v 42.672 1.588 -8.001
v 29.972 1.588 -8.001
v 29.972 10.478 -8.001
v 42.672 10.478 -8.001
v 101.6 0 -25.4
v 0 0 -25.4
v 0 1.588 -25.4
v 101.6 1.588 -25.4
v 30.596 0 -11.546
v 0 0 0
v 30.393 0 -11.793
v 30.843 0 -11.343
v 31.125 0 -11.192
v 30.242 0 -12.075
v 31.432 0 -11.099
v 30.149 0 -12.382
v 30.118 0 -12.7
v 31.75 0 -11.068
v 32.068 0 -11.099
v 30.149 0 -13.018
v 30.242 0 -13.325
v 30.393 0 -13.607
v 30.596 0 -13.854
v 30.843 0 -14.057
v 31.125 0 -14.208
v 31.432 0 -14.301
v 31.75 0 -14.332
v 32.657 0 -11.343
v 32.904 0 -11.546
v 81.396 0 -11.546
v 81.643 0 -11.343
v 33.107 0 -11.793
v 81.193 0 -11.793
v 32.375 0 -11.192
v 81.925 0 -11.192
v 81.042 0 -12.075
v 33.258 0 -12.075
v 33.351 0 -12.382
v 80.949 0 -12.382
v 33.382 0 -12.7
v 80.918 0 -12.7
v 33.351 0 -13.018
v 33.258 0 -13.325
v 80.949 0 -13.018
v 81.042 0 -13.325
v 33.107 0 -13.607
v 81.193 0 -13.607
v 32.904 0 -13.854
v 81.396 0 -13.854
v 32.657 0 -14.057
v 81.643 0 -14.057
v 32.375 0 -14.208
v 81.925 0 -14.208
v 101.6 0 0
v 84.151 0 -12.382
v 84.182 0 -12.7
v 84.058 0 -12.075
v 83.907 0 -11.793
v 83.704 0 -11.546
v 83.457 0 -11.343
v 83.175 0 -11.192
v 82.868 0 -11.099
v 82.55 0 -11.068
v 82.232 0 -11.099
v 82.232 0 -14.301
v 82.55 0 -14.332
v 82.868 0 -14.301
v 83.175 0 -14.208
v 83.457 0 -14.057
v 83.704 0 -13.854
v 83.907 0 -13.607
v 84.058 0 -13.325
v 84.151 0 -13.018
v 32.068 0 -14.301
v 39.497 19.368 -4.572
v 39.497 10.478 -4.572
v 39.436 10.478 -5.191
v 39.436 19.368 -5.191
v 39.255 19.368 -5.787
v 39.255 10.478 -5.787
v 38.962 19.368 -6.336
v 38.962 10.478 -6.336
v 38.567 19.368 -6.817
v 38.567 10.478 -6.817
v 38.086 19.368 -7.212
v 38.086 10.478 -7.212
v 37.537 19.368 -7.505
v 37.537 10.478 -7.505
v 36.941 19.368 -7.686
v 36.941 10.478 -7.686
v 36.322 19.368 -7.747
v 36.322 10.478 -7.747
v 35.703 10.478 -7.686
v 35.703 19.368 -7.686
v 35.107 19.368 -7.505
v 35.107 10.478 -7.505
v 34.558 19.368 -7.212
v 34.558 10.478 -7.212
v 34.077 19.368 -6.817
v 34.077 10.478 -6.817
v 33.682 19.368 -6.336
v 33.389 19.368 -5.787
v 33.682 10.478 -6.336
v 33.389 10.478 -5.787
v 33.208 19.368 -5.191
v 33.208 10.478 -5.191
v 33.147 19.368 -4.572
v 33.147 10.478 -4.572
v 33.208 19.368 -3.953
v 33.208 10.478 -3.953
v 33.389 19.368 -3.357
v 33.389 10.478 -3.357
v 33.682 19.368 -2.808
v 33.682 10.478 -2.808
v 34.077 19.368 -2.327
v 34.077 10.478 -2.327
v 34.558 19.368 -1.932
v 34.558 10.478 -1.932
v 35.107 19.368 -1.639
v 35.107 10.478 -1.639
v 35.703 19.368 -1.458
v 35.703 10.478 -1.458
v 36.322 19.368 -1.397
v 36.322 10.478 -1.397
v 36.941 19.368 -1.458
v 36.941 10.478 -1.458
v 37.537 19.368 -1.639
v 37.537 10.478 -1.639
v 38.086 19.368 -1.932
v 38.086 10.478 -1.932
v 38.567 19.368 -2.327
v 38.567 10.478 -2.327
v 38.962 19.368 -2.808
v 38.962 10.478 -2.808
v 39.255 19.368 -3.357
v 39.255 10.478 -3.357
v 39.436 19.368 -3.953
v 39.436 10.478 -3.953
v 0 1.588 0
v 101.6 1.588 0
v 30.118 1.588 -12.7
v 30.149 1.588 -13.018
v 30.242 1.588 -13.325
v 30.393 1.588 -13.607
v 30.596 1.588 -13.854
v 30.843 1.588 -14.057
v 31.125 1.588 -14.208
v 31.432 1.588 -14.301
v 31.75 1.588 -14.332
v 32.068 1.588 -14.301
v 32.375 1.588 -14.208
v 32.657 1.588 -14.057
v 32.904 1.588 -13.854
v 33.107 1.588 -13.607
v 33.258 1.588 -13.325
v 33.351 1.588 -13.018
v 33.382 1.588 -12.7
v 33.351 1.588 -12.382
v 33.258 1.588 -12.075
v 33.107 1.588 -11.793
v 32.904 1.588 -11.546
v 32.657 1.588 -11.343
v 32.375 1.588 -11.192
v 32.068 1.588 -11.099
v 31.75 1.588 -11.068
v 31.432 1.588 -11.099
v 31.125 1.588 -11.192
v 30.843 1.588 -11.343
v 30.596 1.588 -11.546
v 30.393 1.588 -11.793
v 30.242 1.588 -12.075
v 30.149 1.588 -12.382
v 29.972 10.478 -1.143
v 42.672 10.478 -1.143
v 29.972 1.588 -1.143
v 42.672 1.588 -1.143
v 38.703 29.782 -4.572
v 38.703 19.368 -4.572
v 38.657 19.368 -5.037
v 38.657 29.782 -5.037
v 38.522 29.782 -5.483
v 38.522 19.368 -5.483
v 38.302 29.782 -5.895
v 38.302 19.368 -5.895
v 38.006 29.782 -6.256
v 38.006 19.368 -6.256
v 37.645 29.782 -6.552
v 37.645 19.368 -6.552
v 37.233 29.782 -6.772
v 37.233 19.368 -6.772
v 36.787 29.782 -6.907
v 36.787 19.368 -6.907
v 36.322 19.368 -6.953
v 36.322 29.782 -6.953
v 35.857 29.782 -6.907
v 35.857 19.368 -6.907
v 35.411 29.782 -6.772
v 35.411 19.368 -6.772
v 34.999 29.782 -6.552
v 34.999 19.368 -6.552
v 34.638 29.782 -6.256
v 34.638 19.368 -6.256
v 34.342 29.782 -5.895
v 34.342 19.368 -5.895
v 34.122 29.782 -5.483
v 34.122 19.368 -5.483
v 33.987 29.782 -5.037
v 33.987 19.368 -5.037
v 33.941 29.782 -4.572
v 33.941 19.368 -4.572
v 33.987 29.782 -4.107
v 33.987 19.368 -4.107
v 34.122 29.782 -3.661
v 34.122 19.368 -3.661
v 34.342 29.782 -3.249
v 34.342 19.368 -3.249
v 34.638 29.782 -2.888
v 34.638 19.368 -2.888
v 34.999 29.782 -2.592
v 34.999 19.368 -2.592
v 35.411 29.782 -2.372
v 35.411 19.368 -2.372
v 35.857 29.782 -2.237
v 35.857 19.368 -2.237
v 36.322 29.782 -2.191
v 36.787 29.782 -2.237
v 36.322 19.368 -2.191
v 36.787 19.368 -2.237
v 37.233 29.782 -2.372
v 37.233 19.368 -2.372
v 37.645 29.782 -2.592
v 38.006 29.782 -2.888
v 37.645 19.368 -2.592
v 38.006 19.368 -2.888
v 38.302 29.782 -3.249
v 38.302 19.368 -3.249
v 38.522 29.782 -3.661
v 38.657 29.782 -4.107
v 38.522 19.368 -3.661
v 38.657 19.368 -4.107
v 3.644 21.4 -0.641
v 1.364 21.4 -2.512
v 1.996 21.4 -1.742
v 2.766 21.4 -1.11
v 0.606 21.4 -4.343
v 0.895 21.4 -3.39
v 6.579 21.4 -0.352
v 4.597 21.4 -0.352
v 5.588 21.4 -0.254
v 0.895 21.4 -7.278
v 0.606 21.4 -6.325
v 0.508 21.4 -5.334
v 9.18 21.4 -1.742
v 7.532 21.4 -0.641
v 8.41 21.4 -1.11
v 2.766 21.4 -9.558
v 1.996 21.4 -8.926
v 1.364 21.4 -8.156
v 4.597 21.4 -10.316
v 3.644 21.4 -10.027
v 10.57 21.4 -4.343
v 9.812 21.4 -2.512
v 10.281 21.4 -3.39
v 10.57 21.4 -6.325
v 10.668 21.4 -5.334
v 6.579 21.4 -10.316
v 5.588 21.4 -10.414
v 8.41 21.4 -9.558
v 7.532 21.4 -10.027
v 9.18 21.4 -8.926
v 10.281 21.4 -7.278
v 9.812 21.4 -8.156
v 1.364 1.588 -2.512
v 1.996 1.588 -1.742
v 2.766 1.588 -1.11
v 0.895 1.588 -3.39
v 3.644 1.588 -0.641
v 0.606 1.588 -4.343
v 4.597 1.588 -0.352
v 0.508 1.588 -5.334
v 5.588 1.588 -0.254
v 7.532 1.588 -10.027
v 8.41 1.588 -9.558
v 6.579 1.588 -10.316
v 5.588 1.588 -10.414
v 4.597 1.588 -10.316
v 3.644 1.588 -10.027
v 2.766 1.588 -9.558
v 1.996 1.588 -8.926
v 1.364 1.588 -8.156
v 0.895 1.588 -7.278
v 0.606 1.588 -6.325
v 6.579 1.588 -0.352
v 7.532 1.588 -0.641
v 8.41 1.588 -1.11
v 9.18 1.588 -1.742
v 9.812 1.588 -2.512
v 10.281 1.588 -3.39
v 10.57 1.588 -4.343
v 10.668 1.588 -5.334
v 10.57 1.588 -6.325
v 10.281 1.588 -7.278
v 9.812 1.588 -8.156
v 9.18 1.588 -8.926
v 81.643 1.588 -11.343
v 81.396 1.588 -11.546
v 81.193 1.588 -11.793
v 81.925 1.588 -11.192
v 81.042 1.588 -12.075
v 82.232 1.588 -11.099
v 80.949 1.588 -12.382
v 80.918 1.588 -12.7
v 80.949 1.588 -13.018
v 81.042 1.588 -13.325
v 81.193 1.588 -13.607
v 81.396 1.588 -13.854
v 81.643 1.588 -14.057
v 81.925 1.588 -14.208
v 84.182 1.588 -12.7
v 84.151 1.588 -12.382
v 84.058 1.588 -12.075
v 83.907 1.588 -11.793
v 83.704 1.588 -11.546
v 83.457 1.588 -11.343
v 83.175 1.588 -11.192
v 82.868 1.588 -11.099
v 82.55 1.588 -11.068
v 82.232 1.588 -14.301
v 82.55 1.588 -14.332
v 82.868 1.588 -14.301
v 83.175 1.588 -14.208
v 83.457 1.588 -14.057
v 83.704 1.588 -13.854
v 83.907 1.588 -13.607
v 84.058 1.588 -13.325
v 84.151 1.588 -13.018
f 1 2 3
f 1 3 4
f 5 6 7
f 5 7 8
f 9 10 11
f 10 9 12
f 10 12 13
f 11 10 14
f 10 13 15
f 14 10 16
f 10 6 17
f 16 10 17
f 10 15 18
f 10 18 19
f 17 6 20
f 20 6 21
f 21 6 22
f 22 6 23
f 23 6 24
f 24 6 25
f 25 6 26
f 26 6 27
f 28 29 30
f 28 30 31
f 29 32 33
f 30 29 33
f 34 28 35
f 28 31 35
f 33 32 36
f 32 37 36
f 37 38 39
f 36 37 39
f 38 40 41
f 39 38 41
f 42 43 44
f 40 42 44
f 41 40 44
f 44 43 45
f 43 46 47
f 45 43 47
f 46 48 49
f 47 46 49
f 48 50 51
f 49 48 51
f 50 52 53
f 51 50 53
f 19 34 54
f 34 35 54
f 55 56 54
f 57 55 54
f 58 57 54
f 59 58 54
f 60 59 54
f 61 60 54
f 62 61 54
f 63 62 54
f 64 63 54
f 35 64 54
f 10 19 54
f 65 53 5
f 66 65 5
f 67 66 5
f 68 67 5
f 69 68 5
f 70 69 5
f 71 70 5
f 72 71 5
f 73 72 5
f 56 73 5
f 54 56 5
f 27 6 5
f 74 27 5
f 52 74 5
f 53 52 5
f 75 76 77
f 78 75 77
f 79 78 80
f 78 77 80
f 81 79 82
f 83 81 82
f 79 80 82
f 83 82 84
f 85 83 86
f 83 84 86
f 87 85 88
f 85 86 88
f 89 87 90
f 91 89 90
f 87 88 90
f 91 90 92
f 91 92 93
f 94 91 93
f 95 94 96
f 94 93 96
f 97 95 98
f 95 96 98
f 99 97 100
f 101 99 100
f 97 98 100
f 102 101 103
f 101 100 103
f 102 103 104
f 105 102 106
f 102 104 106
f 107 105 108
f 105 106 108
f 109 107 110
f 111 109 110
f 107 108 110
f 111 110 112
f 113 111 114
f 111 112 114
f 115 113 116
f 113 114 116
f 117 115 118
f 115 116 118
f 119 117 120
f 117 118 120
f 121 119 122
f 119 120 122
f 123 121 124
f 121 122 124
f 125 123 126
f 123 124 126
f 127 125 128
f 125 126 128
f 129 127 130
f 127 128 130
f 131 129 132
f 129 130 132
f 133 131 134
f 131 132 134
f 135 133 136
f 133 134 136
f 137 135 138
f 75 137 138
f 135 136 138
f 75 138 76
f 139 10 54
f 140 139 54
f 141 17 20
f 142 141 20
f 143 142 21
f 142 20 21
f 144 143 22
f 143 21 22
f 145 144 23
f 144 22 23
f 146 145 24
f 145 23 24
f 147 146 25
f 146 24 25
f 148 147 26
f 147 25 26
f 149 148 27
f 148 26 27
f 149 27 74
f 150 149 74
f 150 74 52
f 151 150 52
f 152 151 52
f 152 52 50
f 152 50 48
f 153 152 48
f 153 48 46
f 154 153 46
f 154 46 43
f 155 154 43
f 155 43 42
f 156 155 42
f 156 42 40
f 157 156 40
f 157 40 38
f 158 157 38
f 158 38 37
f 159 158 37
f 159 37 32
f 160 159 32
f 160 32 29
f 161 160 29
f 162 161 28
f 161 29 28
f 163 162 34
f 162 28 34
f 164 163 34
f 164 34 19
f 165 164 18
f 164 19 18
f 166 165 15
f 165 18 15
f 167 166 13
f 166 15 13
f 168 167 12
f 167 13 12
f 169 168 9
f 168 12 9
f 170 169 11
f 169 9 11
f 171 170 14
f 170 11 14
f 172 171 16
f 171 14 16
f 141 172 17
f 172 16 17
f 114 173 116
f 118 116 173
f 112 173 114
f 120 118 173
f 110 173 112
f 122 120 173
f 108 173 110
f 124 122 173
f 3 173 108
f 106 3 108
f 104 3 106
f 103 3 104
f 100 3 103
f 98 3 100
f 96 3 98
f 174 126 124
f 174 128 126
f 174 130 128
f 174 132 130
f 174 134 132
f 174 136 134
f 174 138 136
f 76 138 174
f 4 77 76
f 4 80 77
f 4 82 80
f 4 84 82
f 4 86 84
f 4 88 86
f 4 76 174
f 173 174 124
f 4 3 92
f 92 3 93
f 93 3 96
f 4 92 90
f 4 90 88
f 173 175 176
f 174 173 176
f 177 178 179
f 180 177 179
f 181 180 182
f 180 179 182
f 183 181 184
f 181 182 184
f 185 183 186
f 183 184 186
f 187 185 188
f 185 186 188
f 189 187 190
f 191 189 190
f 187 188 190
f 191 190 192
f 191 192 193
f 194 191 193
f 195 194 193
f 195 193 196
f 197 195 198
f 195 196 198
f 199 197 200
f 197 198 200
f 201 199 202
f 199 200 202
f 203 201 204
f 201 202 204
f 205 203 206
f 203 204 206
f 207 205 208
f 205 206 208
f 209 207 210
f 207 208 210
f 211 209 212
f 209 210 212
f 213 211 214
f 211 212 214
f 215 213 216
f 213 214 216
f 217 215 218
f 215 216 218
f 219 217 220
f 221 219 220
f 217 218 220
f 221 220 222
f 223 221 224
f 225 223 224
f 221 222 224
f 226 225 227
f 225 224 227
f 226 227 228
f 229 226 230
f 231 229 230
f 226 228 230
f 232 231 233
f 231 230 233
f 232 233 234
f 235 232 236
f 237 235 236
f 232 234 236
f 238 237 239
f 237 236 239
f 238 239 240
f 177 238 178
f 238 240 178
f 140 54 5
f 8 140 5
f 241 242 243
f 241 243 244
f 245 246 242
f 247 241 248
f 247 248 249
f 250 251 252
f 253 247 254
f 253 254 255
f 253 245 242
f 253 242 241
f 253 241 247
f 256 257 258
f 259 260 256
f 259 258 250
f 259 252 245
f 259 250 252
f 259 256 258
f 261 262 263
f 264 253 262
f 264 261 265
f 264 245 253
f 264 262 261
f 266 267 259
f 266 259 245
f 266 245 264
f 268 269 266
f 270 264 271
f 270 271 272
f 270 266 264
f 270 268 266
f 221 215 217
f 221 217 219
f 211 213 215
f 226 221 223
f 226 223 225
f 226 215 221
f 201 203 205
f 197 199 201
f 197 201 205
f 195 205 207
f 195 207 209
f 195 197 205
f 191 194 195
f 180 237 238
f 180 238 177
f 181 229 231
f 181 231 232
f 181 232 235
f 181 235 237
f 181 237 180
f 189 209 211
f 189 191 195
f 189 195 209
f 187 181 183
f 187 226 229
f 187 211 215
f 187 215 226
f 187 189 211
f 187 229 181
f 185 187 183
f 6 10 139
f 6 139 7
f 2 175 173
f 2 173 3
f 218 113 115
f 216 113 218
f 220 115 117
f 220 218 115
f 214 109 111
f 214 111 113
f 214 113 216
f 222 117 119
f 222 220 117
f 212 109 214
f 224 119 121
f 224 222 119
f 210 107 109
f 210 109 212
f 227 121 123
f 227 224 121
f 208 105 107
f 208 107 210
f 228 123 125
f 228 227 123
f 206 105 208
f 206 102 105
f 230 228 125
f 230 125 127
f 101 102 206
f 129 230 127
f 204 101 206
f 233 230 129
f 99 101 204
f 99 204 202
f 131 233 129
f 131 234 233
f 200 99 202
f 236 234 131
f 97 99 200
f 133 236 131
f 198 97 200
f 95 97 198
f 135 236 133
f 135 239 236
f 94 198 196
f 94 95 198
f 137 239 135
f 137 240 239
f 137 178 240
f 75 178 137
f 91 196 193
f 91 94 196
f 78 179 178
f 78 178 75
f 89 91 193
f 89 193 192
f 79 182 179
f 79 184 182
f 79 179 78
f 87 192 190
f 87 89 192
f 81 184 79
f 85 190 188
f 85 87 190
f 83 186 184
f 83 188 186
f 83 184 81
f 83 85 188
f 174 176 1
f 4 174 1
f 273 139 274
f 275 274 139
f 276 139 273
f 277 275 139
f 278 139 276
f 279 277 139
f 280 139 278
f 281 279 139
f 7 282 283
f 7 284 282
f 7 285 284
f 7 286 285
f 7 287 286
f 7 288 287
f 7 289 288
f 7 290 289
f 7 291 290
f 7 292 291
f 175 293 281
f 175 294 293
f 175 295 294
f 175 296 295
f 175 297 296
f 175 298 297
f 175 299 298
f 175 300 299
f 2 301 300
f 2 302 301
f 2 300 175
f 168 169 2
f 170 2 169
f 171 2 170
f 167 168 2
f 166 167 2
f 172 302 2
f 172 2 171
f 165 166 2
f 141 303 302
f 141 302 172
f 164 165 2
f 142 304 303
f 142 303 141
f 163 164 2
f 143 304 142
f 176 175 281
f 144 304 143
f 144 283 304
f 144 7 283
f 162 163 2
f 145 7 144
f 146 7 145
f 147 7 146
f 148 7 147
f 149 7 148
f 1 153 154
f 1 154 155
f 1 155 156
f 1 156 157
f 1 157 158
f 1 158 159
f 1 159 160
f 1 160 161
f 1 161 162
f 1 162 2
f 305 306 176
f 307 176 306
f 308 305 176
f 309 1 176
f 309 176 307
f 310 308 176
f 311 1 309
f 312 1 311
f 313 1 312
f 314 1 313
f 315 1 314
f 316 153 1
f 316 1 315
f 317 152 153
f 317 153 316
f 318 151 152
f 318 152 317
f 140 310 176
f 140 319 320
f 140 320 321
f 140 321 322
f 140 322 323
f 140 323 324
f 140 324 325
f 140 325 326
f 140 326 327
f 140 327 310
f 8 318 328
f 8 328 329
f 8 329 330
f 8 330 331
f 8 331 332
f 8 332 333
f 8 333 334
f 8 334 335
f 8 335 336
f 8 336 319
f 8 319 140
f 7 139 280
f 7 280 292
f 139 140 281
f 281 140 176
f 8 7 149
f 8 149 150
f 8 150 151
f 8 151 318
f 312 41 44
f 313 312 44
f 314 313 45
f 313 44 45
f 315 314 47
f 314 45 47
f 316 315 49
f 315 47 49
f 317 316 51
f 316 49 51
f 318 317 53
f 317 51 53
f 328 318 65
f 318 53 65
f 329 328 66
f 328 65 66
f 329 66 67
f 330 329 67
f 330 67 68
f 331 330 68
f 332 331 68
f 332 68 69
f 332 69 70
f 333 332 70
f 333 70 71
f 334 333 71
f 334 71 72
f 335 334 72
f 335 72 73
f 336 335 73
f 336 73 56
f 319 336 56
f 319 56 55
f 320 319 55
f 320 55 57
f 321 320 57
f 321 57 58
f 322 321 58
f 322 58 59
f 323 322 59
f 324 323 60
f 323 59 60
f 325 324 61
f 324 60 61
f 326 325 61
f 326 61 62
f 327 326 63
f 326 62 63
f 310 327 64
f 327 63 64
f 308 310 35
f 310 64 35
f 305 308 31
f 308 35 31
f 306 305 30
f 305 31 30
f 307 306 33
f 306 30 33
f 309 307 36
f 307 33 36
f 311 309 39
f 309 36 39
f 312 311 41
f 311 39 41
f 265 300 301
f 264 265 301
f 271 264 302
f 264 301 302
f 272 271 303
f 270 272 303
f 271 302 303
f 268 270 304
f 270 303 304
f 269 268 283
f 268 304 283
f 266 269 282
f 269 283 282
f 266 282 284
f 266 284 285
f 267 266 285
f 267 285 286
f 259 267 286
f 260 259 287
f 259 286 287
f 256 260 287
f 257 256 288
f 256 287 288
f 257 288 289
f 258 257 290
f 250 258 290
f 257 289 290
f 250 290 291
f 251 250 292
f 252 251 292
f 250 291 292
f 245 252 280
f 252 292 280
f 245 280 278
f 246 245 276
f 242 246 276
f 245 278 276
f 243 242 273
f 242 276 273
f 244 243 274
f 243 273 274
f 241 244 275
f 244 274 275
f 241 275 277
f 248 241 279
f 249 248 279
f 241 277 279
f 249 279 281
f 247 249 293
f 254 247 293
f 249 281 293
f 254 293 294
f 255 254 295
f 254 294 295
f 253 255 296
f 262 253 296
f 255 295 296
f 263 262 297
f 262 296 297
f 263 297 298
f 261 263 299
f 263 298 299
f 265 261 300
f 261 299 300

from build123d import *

# Parameters (mm, degrees)
SKETCH1_W                 = 101.6
SKETCH1_H                 = 25.4
BOSS_EXTRUDE1_DEPTH       = 1.5875
F_4_CLEARANCE_HOLE2_D     = 3.2639
F_4_CLEARANCE_HOLE2_DEPTH = 1.5875
SKETCH5_R                 = 5.08
BOSS_EXTRUDE2_DEPTH       = 19.812
SKETCH6_W                 = 12.7
SKETCH6_H                 = 6.858
BOSS_EXTRUDE3_DEPTH       = 8.89
SKETCH7_R                 = 3.175
BOSS_EXTRUDE4_DEPTH       = 8.89
SKETCH8_R                 = 2.38125
BOSS_EXTRUDE5_DEPTH       = 10.414


with BuildPart() as part:
    # Sketch1 → Boss-Extrude1 (new body)
    with BuildSketch(Plane(origin=(0, 0, 0), x_dir=(1, 0, 0), z_dir=(0, 1, 0))):
        with Locations((50.8, 12.7)):
            Rectangle(SKETCH1_W, SKETCH1_H)
    extrude(amount=BOSS_EXTRUDE1_DEPTH)

    # #4 Clearance Hole2
    with Locations(Plane(origin=(0, 1.5875, 0), x_dir=(1, 0, 0), z_dir=(0, 1, 0))):
        with Locations((31.75, 12.7), (82.55, 12.7)):
            Hole(F_4_CLEARANCE_HOLE2_D / 2, depth=F_4_CLEARANCE_HOLE2_DEPTH)

    # Sketch5 → Boss-Extrude2 (add)
    with BuildSketch(Plane(origin=(0, 1.5875, 0), x_dir=(1, 0, 0), z_dir=(0, 1, 0))):
        with Locations((5.588, 5.334)):
            Circle(SKETCH5_R)
    extrude(amount=BOSS_EXTRUDE2_DEPTH)

    # Sketch6 → Boss-Extrude3 (add)
    with BuildSketch(Plane(origin=(0, 1.5875, 0), x_dir=(1, 0, 0), z_dir=(0, 1, 0))):
        with Locations((36.322, 4.572)):
            Rectangle(SKETCH6_W, SKETCH6_H)
    extrude(amount=BOSS_EXTRUDE3_DEPTH)

    # Sketch7 → Boss-Extrude4 (add)
    with BuildSketch(Plane(origin=(0, 10.4775, 0), x_dir=(1, 0, 0), z_dir=(0, 1, 0))):
        with Locations((36.322, 4.572)):
            Circle(SKETCH7_R)
    extrude(amount=BOSS_EXTRUDE4_DEPTH)

    # Sketch8 → Boss-Extrude5 (add)
    with BuildSketch(Plane(origin=(0, 19.3675, 0), x_dir=(1, 0, 0), z_dir=(0, 1, 0))):
        with Locations((36.322, 4.572)):
            Circle(SKETCH8_R)
    extrude(amount=BOSS_EXTRUDE5_DEPTH)


solid = part.part
